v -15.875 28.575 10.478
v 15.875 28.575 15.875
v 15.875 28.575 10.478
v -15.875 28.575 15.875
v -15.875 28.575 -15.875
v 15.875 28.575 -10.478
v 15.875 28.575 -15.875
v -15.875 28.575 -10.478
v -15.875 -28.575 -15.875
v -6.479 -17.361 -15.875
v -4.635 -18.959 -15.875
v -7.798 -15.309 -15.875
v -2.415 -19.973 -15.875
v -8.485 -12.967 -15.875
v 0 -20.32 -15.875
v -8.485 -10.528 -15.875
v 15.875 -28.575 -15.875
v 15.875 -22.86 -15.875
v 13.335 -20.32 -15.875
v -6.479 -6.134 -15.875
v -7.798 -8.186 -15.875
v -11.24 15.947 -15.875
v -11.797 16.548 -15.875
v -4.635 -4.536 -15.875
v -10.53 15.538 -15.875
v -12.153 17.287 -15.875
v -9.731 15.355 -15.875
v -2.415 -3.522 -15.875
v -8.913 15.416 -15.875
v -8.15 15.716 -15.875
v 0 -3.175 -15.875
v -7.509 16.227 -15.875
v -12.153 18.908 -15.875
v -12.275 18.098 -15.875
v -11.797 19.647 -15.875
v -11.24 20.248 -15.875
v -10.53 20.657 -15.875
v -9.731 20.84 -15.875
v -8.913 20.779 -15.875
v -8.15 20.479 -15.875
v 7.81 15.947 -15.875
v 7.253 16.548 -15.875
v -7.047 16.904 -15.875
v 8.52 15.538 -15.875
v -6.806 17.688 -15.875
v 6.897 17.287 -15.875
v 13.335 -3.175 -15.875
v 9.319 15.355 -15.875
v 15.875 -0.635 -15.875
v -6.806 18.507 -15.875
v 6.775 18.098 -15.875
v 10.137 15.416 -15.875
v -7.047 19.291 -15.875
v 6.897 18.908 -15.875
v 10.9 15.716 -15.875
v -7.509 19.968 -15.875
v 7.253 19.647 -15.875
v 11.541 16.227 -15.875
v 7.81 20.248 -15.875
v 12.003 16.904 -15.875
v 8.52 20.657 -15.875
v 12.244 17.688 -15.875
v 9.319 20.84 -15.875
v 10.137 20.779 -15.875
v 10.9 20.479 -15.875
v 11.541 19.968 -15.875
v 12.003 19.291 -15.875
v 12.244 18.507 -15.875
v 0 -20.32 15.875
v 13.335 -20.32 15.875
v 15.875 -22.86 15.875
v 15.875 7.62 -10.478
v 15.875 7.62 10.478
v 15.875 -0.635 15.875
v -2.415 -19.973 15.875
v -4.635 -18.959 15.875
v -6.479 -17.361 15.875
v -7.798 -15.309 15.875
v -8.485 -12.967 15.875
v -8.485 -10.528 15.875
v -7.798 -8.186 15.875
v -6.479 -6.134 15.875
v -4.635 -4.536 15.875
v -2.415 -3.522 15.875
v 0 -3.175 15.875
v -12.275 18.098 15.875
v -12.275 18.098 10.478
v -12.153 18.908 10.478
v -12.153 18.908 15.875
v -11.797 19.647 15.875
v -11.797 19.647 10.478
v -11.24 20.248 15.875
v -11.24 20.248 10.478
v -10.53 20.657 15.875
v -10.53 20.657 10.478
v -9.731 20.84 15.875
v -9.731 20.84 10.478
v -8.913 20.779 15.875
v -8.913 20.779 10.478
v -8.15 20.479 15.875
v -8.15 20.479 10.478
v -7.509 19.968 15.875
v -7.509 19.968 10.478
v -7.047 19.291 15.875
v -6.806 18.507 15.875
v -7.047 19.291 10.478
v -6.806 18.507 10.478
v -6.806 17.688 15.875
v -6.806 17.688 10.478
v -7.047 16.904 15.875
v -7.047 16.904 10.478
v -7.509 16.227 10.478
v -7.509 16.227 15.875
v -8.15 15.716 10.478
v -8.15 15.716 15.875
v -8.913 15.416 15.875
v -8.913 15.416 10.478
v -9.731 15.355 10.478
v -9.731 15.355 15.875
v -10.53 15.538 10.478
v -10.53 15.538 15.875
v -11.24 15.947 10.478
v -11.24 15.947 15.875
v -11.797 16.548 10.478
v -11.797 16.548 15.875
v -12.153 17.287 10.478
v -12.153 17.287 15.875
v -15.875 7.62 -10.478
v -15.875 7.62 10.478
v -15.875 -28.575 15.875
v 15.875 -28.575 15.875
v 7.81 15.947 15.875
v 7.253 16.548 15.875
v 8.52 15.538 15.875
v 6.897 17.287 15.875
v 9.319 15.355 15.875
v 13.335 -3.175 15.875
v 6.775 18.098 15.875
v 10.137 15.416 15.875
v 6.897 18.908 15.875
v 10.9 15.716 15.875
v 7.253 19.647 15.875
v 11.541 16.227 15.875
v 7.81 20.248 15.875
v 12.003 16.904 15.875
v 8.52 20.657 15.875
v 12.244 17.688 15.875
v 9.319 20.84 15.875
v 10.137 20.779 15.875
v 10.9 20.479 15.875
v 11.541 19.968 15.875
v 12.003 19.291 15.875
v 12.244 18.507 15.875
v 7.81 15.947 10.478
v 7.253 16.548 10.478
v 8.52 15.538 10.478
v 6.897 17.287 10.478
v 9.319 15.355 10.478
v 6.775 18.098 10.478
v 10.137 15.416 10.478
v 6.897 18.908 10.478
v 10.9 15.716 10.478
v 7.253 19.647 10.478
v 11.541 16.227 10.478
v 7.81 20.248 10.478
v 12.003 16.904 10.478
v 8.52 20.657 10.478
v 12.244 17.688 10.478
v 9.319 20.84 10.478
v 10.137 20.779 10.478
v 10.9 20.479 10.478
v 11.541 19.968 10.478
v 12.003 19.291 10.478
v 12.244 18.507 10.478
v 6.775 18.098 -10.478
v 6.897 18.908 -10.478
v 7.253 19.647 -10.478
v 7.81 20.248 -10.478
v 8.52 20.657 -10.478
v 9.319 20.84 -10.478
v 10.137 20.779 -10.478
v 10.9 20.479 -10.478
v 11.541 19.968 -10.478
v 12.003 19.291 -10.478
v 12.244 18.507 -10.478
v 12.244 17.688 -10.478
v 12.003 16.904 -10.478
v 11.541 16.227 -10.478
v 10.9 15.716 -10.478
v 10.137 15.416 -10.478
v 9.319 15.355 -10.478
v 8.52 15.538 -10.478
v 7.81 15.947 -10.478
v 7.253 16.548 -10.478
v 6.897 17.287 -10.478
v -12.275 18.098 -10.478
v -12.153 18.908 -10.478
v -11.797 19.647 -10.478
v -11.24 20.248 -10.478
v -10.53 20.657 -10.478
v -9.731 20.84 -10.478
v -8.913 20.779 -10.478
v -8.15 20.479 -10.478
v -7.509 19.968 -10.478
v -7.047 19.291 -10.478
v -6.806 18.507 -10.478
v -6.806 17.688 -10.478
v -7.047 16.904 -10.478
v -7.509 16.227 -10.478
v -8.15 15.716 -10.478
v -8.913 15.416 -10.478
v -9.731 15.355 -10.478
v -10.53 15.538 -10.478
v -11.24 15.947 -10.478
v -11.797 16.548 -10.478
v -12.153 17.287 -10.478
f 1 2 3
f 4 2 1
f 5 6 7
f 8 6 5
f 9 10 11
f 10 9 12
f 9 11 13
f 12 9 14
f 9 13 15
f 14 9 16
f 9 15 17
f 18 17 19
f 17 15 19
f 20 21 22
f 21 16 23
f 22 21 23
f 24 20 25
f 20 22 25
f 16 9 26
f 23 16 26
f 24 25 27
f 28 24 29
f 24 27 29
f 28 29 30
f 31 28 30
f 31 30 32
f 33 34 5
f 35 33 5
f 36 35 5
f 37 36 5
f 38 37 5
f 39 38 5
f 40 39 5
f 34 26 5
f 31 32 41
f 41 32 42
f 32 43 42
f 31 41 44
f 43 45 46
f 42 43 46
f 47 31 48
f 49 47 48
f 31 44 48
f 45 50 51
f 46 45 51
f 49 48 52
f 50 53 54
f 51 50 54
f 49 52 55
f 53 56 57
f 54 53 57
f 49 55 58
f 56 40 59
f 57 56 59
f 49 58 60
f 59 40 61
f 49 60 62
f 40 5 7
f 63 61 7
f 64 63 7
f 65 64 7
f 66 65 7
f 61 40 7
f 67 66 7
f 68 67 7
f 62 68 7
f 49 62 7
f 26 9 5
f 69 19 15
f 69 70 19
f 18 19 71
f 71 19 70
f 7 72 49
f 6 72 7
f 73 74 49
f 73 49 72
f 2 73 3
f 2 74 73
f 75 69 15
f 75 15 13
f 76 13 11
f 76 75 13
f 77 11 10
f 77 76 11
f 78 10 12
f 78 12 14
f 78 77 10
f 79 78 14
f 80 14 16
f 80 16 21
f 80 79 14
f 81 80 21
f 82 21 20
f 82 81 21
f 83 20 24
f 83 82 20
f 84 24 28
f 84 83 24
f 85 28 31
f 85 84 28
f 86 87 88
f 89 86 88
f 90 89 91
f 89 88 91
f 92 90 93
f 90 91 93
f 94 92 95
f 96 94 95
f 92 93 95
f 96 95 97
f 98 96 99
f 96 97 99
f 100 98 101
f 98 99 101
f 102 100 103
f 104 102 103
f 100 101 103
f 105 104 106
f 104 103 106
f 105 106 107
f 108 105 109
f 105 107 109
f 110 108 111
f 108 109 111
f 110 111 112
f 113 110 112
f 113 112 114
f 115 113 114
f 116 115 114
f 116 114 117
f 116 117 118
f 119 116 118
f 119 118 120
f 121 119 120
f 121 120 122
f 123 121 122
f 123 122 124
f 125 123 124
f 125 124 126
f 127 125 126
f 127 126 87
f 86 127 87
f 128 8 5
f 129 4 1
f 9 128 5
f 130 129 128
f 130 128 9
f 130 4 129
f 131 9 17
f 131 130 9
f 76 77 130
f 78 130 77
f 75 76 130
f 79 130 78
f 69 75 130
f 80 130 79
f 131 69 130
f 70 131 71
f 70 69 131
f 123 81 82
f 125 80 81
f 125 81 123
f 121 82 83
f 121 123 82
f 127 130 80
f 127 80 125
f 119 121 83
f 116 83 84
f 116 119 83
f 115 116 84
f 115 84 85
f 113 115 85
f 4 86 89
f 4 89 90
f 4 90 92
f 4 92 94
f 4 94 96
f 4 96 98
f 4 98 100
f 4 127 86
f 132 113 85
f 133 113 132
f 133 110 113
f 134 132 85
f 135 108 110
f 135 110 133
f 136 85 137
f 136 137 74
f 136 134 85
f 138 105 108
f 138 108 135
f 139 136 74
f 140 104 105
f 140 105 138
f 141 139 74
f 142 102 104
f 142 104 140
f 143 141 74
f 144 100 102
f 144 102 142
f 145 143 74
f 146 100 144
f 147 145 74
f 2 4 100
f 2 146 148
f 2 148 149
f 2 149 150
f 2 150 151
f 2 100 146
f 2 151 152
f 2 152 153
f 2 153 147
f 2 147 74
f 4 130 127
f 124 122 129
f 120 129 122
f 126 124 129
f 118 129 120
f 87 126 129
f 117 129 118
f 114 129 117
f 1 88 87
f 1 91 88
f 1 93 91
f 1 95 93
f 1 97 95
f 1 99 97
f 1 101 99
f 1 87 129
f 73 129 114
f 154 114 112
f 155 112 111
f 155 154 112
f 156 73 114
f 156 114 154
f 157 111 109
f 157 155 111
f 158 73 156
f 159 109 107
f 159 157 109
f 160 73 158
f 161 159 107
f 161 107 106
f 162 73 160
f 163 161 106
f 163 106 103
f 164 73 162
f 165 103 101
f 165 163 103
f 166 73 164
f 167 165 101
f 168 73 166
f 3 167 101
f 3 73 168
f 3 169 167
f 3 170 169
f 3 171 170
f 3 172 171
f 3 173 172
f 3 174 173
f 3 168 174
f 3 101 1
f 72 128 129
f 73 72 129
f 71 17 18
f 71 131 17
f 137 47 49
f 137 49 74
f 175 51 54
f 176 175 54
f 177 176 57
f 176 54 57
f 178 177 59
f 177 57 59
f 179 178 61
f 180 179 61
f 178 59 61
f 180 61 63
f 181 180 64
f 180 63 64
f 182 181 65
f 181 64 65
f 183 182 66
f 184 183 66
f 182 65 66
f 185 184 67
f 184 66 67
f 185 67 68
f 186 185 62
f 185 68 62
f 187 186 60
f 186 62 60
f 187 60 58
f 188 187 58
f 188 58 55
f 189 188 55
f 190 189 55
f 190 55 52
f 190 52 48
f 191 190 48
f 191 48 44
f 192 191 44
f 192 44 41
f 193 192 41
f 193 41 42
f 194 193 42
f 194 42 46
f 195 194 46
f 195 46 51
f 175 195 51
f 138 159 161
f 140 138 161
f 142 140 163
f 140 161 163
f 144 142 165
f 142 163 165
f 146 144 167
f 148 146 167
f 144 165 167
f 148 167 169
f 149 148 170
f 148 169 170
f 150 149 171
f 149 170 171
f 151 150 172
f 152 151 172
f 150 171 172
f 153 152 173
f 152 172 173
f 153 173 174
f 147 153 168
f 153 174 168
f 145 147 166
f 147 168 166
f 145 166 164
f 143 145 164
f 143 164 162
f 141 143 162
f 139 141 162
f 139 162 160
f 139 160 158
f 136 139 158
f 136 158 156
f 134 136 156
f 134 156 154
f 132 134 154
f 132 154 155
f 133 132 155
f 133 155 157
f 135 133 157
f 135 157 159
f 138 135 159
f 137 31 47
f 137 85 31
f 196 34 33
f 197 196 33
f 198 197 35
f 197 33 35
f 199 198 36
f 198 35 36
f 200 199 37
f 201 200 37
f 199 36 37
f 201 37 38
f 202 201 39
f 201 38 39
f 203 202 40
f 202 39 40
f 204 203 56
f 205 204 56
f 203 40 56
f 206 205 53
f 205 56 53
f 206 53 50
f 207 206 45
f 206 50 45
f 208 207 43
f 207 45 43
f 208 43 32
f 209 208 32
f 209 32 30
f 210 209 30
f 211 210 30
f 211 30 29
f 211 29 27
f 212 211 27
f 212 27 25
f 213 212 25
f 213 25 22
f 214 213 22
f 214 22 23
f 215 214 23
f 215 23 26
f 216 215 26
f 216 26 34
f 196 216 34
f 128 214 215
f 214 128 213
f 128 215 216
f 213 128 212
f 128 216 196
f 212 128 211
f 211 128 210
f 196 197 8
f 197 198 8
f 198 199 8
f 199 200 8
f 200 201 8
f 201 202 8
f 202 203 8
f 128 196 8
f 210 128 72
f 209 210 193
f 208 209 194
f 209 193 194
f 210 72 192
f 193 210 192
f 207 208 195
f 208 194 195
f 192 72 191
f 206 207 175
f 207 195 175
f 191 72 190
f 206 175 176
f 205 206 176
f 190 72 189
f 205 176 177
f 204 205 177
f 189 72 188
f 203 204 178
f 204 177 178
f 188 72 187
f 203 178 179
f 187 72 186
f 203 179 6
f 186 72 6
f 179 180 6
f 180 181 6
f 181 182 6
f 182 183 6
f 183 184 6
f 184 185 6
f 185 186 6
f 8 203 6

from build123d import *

# Parameters (mm, degrees)
F1_DEPTH = 15.875
F2_W     = 20.955
F2_H     = 20.955
F3_DEPTH = 31.751
F5_D     = 5.5
F6_SIZE  = 2.54


with BuildPart() as f1:
    # F0 (on Top) → F1 (new body, symmetric)
    with BuildSketch(Plane.XY):
        with BuildLine():
            Line((-15.875, -28.575), (15.875, -28.575))
            Line((15.875, -28.575), (15.875, -20.32))
            Line((15.875, -20.32), (0, -20.32))
            ThreePointArc((0, -20.32), (-8.5725, -11.7475), (0, -3.175))
            Line((0, -3.175), (15.875, -3.175))
            Line((15.875, -3.175), (15.875, 28.575))
            Line((15.875, 28.575), (-15.875, 28.575))
            Line((-15.875, 28.575), (-15.875, -28.575))
        make_face()
    extrude(amount=F1_DEPTH, both=True)

    # F2 (on face) → F3 (cut, through all)
    with BuildSketch(Plane.YZ.offset(15.875)):
        with Locations((18.0975, 0)):
            Rectangle(F2_W, F2_H)
    extrude(amount=-F3_DEPTH, mode=Mode.SUBTRACT)

    # F5 (through all)
    with Locations(Plane.XY.offset(15.875)):
        with Locations((-9.525, 18.0975), (9.525, 18.0975)):
            Hole(F5_D / 2)

    # F6
    f6_edges = [f1.edges().sort_by_distance(p)[0] for p in [
        (15.875, -20.32, 0),
        (15.875, -3.175, 0),
    ]]
    chamfer(f6_edges, length=F6_SIZE)


solid = f1.part
